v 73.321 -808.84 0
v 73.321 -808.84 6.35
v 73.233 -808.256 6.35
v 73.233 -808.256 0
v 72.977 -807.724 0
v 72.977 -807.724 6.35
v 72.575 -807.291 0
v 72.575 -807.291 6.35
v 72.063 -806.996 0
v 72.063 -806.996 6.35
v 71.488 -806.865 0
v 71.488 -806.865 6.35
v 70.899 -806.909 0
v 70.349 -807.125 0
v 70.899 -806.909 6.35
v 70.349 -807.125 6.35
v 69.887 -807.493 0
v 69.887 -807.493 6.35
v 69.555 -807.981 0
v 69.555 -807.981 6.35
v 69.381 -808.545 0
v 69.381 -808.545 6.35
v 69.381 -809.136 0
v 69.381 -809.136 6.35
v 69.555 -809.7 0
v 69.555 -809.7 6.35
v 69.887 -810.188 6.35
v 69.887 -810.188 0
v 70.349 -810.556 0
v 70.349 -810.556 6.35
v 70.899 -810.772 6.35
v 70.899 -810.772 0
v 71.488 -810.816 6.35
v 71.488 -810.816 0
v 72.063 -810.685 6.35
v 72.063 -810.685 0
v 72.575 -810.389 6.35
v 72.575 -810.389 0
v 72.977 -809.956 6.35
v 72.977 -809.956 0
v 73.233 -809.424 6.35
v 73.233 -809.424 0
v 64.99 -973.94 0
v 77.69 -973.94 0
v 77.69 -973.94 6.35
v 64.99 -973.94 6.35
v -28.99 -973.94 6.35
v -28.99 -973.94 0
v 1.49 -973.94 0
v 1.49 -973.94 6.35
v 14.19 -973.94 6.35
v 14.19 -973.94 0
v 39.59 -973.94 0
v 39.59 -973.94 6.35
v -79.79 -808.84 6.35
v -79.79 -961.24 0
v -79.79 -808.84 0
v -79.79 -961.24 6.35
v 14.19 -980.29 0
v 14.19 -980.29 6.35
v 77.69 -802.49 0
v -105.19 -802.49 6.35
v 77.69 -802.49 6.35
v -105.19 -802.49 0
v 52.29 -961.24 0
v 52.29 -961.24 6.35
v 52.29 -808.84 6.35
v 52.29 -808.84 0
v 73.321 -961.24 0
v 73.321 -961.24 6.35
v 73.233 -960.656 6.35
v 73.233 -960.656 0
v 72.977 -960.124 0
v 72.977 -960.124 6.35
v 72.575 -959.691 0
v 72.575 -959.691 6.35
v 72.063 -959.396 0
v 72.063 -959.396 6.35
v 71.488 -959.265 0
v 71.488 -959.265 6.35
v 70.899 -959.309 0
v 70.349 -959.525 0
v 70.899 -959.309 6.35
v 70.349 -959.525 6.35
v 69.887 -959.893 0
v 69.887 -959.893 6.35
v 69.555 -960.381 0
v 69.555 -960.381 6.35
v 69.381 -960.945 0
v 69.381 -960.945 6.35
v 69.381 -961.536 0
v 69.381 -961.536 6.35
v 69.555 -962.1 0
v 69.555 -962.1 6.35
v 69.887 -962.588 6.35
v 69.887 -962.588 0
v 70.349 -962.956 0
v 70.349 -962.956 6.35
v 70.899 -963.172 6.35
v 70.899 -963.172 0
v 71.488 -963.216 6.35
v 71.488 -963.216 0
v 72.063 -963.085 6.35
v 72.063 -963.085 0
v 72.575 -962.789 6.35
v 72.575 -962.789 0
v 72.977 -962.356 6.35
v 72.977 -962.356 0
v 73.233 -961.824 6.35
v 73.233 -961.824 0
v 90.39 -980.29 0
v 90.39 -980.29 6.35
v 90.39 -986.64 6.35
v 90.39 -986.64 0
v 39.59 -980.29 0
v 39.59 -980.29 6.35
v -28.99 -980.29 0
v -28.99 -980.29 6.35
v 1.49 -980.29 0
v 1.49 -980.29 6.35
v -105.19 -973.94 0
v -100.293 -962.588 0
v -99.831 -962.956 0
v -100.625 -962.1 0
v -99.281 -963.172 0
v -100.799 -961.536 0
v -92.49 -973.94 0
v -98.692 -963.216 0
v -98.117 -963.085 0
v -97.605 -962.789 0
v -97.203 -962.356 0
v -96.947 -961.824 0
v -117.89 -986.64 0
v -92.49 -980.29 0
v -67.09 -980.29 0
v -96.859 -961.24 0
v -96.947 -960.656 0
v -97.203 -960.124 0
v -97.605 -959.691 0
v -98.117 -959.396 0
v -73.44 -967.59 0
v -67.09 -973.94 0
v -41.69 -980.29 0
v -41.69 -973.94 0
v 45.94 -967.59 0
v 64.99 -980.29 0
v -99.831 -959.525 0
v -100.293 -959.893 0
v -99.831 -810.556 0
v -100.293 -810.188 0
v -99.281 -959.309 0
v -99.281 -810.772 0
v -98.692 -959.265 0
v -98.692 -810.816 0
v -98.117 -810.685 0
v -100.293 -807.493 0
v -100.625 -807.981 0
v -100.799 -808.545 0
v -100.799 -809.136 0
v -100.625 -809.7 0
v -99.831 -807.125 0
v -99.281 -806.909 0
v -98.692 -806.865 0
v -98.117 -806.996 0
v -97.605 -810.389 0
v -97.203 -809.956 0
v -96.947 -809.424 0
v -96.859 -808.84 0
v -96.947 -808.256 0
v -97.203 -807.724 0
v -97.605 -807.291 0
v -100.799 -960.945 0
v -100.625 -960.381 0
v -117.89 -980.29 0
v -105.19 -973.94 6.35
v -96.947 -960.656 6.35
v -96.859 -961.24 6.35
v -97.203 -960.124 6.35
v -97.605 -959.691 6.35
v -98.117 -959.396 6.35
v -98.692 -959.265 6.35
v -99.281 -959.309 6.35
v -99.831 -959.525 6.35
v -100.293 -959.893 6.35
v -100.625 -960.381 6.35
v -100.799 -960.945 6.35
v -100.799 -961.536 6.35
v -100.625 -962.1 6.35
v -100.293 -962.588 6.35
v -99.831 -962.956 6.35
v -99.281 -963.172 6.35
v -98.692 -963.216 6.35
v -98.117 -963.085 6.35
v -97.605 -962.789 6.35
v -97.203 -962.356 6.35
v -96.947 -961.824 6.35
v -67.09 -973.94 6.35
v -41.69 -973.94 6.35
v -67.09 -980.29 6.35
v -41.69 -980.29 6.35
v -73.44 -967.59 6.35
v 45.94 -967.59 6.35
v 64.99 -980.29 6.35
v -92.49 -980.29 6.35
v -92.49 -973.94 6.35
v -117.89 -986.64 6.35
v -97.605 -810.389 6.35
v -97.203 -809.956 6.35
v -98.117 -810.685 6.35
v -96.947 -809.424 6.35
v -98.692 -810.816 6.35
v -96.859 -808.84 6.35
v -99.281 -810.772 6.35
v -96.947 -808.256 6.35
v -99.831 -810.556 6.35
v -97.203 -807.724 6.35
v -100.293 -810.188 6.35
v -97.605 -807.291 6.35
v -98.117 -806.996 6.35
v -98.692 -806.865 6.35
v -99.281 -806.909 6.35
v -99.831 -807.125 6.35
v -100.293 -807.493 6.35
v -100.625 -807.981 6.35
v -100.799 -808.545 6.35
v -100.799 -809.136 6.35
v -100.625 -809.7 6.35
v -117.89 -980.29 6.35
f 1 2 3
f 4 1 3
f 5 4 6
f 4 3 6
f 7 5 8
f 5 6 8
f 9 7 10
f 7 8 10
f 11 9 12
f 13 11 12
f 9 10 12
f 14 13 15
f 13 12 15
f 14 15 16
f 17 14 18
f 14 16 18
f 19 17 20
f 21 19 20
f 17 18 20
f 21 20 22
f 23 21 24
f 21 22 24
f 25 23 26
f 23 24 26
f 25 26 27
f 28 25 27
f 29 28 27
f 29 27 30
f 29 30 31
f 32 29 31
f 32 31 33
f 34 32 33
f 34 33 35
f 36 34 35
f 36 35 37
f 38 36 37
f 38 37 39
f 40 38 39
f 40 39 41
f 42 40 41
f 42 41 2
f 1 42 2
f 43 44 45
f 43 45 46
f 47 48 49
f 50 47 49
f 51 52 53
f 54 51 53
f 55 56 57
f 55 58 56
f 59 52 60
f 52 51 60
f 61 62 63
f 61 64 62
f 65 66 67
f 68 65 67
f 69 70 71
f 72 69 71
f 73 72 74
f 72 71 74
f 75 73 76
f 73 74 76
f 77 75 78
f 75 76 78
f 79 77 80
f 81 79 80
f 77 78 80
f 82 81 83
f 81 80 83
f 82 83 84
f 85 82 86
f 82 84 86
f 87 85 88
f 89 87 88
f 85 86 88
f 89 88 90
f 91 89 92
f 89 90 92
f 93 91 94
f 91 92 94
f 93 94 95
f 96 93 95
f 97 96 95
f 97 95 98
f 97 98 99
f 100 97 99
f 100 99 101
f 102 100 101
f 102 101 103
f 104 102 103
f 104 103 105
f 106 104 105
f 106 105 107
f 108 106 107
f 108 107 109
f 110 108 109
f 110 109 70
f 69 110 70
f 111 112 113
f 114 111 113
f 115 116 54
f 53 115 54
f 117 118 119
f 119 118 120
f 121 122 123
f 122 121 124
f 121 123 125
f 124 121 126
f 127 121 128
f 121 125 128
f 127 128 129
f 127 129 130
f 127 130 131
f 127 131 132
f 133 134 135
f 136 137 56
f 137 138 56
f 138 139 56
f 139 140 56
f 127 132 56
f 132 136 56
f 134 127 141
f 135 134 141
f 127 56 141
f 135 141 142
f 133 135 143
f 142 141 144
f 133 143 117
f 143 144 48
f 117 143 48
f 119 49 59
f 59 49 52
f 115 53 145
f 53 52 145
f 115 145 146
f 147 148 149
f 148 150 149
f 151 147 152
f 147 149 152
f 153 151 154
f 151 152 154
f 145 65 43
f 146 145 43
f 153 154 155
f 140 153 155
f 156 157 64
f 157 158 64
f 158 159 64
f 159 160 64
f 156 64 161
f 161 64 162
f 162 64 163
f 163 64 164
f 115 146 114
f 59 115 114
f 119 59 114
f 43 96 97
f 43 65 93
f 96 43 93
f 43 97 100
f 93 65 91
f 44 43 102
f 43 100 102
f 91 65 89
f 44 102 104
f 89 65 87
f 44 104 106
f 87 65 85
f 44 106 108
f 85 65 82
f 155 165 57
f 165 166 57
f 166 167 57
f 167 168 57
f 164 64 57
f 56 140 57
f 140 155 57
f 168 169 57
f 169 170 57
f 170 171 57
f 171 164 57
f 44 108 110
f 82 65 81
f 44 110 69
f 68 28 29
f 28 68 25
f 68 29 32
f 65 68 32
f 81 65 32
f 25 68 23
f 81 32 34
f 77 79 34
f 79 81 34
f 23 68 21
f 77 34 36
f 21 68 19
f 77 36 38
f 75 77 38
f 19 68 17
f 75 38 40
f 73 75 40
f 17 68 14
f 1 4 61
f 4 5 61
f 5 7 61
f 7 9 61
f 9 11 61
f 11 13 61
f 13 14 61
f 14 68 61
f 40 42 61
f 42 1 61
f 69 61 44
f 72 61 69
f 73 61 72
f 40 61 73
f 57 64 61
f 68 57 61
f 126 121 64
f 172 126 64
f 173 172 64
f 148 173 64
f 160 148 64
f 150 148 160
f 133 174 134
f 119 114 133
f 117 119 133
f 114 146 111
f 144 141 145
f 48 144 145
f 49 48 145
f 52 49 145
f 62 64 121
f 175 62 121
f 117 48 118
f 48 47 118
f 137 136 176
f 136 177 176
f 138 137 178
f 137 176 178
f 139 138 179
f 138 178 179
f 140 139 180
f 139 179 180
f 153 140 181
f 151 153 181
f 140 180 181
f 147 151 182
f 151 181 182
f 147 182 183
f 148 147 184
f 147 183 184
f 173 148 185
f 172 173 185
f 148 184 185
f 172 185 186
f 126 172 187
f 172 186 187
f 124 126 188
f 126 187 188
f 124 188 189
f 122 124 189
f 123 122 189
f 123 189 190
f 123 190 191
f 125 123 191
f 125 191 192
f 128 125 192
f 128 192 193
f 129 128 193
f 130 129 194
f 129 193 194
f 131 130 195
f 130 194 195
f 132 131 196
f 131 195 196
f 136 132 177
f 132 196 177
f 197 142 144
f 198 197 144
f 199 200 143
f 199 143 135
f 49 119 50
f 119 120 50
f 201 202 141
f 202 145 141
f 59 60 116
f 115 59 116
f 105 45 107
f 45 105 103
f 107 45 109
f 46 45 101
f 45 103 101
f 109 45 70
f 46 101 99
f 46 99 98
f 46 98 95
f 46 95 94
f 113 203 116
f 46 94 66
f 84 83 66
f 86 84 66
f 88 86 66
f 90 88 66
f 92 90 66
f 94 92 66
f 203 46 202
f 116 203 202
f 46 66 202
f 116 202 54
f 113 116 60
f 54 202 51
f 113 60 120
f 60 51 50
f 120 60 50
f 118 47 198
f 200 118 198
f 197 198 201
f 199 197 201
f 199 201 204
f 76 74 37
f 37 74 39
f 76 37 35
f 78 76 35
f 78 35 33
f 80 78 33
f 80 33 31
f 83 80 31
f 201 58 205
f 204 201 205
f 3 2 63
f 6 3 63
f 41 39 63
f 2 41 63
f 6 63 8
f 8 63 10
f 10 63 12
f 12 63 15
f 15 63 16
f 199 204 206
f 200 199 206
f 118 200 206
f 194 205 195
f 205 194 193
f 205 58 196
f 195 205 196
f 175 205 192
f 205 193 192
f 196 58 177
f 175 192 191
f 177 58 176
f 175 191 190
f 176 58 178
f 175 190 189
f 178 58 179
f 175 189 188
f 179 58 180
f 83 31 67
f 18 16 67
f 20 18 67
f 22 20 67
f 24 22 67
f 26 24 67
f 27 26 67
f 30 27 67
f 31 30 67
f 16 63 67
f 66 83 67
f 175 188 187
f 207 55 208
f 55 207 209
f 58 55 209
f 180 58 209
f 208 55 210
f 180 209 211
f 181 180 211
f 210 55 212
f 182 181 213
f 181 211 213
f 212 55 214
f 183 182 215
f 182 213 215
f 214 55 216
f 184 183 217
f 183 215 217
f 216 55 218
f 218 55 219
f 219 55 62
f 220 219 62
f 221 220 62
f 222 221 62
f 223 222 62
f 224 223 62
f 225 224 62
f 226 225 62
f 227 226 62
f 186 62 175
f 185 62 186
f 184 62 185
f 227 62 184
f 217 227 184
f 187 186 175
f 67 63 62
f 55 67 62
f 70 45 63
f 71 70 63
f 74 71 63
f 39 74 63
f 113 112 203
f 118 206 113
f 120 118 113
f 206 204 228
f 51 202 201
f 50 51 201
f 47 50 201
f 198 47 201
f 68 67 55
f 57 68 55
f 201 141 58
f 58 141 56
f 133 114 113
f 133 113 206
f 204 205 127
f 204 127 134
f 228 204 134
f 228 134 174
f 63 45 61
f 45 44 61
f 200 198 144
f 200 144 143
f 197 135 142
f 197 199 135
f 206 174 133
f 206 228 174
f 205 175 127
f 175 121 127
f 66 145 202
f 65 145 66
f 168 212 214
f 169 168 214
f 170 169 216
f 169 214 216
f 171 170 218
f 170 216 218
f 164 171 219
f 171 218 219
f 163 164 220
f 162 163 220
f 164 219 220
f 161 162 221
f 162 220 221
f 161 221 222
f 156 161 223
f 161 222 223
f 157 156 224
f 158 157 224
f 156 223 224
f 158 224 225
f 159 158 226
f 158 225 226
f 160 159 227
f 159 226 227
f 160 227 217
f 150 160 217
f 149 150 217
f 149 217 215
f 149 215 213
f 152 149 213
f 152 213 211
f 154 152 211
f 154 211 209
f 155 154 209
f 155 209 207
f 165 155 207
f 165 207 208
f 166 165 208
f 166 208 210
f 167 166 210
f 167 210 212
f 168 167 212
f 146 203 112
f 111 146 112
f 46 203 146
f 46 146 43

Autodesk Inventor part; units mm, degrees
ref_plane "YZ Plane" through (0, 0, 0) normal (1, 0, 0) x (0, 1, 0)
ref_plane "XZ Plane" through (0, 0, 0) normal (0, 1, 0) x (-1, 0, 0)
ref_plane "XY Plane" through (0, 0, 0) normal (0, 0, 1) x (1, 0, 0)
sketch "Sketch1" plane through (0, 0, 0) normal (0, 0, 1) x (1, 0, 0)
  line L0 (-267.7504, 67.4597) -> (240.2496, 67.4597)
  line L1 (240.2496, 67.4597) -> (240.2496, -986.6403)
  line L2 (240.2496, -986.6403) -> (-267.7504, -986.6403)
  line L3 (-267.7504, -986.6403) -> (-267.7504, 67.4597)
  point P0 (0, 0)
  dimension "d0" = 508
  dimension "d1" = 1054.1
extrude "Extrusion1" add sketch "Sketch1" along normal blind 6.35
sketch "Sketch2" plane through (0, 0, 6.35) normal (0, 0, 1) x (1, 0, 0)
  line L0 (240.2496, -986.6403) -> (-267.7504, -986.6403) projected
  line L1 (-267.7504, -986.6403) -> (-13.7504, -986.6403)
  line L2 (-13.7504, -986.6403) -> (-13.7504, -980.2903)
  line L3 (-13.7504, -980.2903) -> (1.4896, -980.2903)
  line L4 (1.4896, -980.2903) -> (-28.9904, -980.2903)
  line L5 (-28.9904, -980.2903) -> (1.4896, -980.2903)
  line L6 (1.4896, -980.2903) -> (1.4896, -973.9403)
  line L7 (1.4896, -973.9403) -> (-28.9904, -973.9403)
  line L8 (-28.9904, -973.9403) -> (-28.9904, -980.2903)
  point P0 (0, 0)
  dimension "d4" = 254
  dimension "d5" = 6.35
  dimension "d6" = 15.24
  dimension "d7" = 30.48
  dimension "d8" = 6.35
extrude "Extrusion2" cut sketch "Sketch2" against normal blind 104.14
sketch "Sketch3" plane through (0, 0, 6.35) normal (0, 0, 1) x (1, 0, 0)
  line L0 (240.2496, -986.6403) -> (-267.7504, -986.6403) projected
  line L1 (1.4896, -980.2903) -> (14.1896, -980.2903)
  line L2 (-28.9904, -980.2903) -> (-41.6904, -980.2903)
  line L3 (-41.6904, -980.2903) -> (-67.0904, -980.2903)
  line L4 (-67.0904, -980.2903) -> (-67.0904, -973.9403)
  line L5 (-67.0904, -973.9403) -> (-41.6904, -973.9403)
  line L6 (-41.6904, -973.9403) -> (-41.6904, -980.2903)
  line L7 (14.1896, -980.2903) -> (39.5896, -980.2903)
  line L8 (39.5896, -980.2903) -> (39.5896, -973.9403)
  line L9 (39.5896, -973.9403) -> (14.1896, -973.9403)
  line L10 (14.1896, -973.9403) -> (14.1896, -980.2903)
  point P0 (0, 0)
  dimension "d11" = 12.7
  dimension "d12" = 12.7
  dimension "d13" = 25.4
  dimension "d14" = 25.4
extrude "Extrusion3" cut sketch "Sketch3" against normal blind 104.14
sketch "Sketch4" plane through (0, 0, 6.35) normal (0, 0, 1) x (1, 0, 0)
  line L0 (-67.0904, -973.9403) -> (-41.6904, -973.9403) projected
  line L1 (14.1896, -973.9403) -> (39.5896, -973.9403) projected
  line L2 (-28.9904, -973.9403) -> (1.4896, -973.9403) projected
  line L3 (240.2496, 67.4597) -> (240.2496, -986.6403) projected
  line L4 (-267.7504, -986.6403) -> (-267.7504, 67.4597) projected
  line L5 (240.2496, -986.6403) -> (-267.7504, -986.6403) projected
  line L6 (-67.0904, -980.2903) -> (-92.4904, -980.2903)
  line L7 (-92.4904, -980.2903) -> (-117.8904, -980.2903)
  line L8 (-117.8904, -980.2903) -> (-117.8904, -986.6403)
  line L9 (39.5896, -980.2903) -> (64.9896, -980.2903)
  line L10 (64.9896, -980.2903) -> (90.3896, -980.2903)
  line L11 (90.3896, -980.2903) -> (90.3896, -986.6403)
  line L12 (-41.6904, -973.9403) -> (-28.9904, -973.9403)
  line L13 (1.4896, -973.9403) -> (14.1896, -973.9403)
  line L14 (-67.0904, -973.9403) -> (-79.7904, -973.9403)
  line L15 (39.5896, -973.9403) -> (52.2896, -973.9403)
  line L16 (-79.7904, -973.9403) -> (-79.7904, -802.4903)
  line L17 (52.2896, -973.9403) -> (52.2896, -802.4903)
  line L18 (52.2896, -802.4903) -> (-79.7904, -802.4903)
  line L19 (-79.7904, -802.4903) -> (-105.1904, -802.4903)
  line L20 (-105.1904, -802.4903) -> (-105.1904, -815.1903)
  line L21 (-105.1904, -815.1903) -> (-92.4904, -815.1903)
  line L22 (-92.4904, -815.1903) -> (-92.4904, -980.2903)
  line L23 (64.9896, -980.2903) -> (64.9896, -815.1903)
  line L24 (64.9896, -815.1903) -> (77.6896, -815.1903)
  line L25 (77.6896, -815.1903) -> (77.6896, -802.4903)
  line L26 (77.6896, -802.4903) -> (52.2896, -802.4903)
  line L27 (-105.1904, -802.4903) -> (-267.7504, -802.4903)
  line L28 (77.6896, -802.4903) -> (240.2496, -802.4903)
  point P0 (0, 0)
  dimension "d17" = 25.4
  dimension "d18" = 25.4
  dimension "d19" = 25.4
  dimension "d20" = 25.4
  dimension "d21" = 171.45
  dimension "d22" = 25.4
  dimension "d23" = 12.7
extrude "Extrusion4" cut sketch "Sketch4" against normal blind 104.14 contours L14 L16 L18 L17 L15 L1 L13 L2 L12 L0 | L20 L21 L22 L7 L8 L5 L4 L27 | L28 L3 L5 L11 L10 L23 L24 L25
sketch "Sketch5" plane through (0, 0, 6.35) normal (0, 0, 1) x (1, 0, 0)
  line L0 (-92.4904, -815.1903) -> (-92.4904, -980.2903) projected
  line L1 (64.9896, -980.2903) -> (64.9896, -815.1903) projected
  line L2 (-92.4904, -973.9403) -> (-92.4904, -967.5903)
  line L3 (-92.4904, -967.5903) -> (-105.1904, -967.5903)
  line L4 (-105.1904, -967.5903) -> (-105.1904, -954.8903)
  line L5 (-105.1904, -954.8903) -> (-92.4904, -954.8903)
  line L6 (64.9896, -954.8903) -> (77.6896, -954.8903)
  line L7 (77.6896, -954.8903) -> (77.6896, -967.5903)
  line L8 (77.6896, -967.5903) -> (64.9896, -967.5903)
  point P0 (0, 0)
  dimension "d26" = 6.35
  dimension "d27" = 12.7
extrude "Extrusion5" add sketch "Sketch5" against normal blind 6.35
sketch "Sketch6" plane through (0, 0, 6.35) normal (0, 0, 1) x (1, 0, 0)
  line L0 (-79.7904, -802.4903) -> (52.2896, -802.4903) projected
  line L1 (-267.7504, -802.4903) -> (-105.1904, -802.4903) projected
  line L2 (77.6896, -802.4903) -> (240.2496, -802.4903) projected
  line L3 (-267.7504, -802.4903) -> (-242.3504, -802.4903)
  line L4 (-242.3504, -802.4903) -> (-216.9504, -802.4903)
  line L5 (-216.9504, -802.4903) -> (-140.7504, -802.4903)
  line L6 (-140.7504, -802.4903) -> (-115.3504, -802.4903)
  line L7 (-115.3504, -802.4903) -> (-39.1504, -802.4903)
  line L8 (-39.1504, -802.4903) -> (-13.7504, -802.4903)
  line L9 (-13.7504, -802.4903) -> (62.4496, -802.4903)
  line L10 (62.4496, -802.4903) -> (87.8496, -802.4903)
  line L11 (87.8496, -802.4903) -> (164.0496, -802.4903)
  line L12 (164.0496, -802.4903) -> (189.4496, -802.4903)
  line L13 (189.4496, -802.4903) -> (265.6496, -802.4903)
  line L14 (265.6496, -802.4903) -> (240.2496, -802.4903)
  line L15 (-242.3504, -802.4903) -> (-216.9504, -802.4903)
  line L16 (-216.9504, -802.4903) -> (-216.9504, -796.1403)
  line L17 (-216.9504, -796.1403) -> (-242.3504, -796.1403)
  line L18 (-242.3504, -796.1403) -> (-242.3504, -802.4903)
  line L19 (-140.7504, -802.4903) -> (-115.3504, -802.4903)
  line L20 (-115.3504, -802.4903) -> (-115.3504, -796.1403)
  line L21 (-115.3504, -796.1403) -> (-140.7504, -796.1403)
  line L22 (-140.7504, -796.1403) -> (-140.7504, -802.4903)
  line L23 (-39.1504, -802.4903) -> (-13.7504, -802.4903)
  line L24 (-13.7504, -802.4903) -> (-13.7504, -796.1403)
  line L25 (-13.7504, -796.1403) -> (-39.1504, -796.1403)
  line L26 (-39.1504, -796.1403) -> (-39.1504, -802.4903)
  line L27 (62.4496, -802.4903) -> (87.8496, -802.4903)
  line L28 (87.8496, -802.4903) -> (87.8496, -796.1403)
  line L29 (87.8496, -796.1403) -> (62.4496, -796.1403)
  line L30 (62.4496, -796.1403) -> (62.4496, -802.4903)
  line L31 (164.0496, -802.4903) -> (189.4496, -802.4903)
  line L32 (189.4496, -802.4903) -> (189.4496, -796.1403)
  line L33 (189.4496, -796.1403) -> (164.0496, -796.1403)
  line L34 (164.0496, -796.1403) -> (164.0496, -802.4903)
  point P0 (0, 0)
  dimension "d30" = 25.4
  dimension "d31" = 25.4
  dimension "d32" = 76.2
  dimension "d33" = 25.4
  dimension "d34" = 76.2
  dimension "d35" = 25.4
  dimension "d36" = 76.2
  dimension "d37" = 25.4
  dimension "d38" = 76.2
  dimension "d39" = 25.4
  dimension "d40" = 76.2
  dimension "d41" = 25.4
  dimension "d42" = 6.35
extrude "Extrusion6" cut sketch "Sketch6" against normal blind 25.4
sketch "Sketch7" plane through (0, 0, 6.35) normal (0, 0, 1) x (1, 0, 0)
  line L0 (-267.7504, -802.4903) -> (240.2496, -802.4903)
  line L1 (240.2496, -802.4903) -> (240.2496, -808.8403)
  line L2 (240.2496, -808.8403) -> (-267.7504, -808.8403)
  line L3 (-267.7504, -808.8403) -> (-267.7504, -802.4903)
  point P0 (0, 0)
extrude "Extrusion7" add sketch "Sketch7" against normal blind 6.35
sketch "Sketch8" plane through (0, 0, 6.35) normal (0, 0, 1) x (1, 0, 0)
  line L0 (-216.9504, -796.1403) -> (-191.5504, -796.1403)
  line L1 (-191.5504, -796.1403) -> (-191.5504, -789.7903)
  line L2 (-191.5504, -789.7903) -> (-216.9504, -789.7903)
  line L3 (-216.9504, -789.7903) -> (-216.9504, -796.1403)
  line L4 (-115.3504, -796.1403) -> (-89.9504, -796.1403)
  line L5 (-89.9504, -796.1403) -> (-89.9504, -789.7903)
  line L6 (-89.9504, -789.7903) -> (-115.3504, -789.7903)
  line L7 (-115.3504, -789.7903) -> (-115.3504, -796.1403)
  line L8 (-13.7504, -796.1403) -> (11.6496, -796.1403)
  line L9 (11.6496, -796.1403) -> (11.6496, -789.7903)
  line L10 (11.6496, -789.7903) -> (-13.7504, -789.7903)
  line L11 (-13.7504, -789.7903) -> (-13.7504, -796.1403)
  line L12 (87.8496, -796.1403) -> (113.2496, -796.1403)
  line L13 (113.2496, -796.1403) -> (113.2496, -789.7903)
  line L14 (113.2496, -789.7903) -> (87.8496, -789.7903)
  line L15 (87.8496, -789.7903) -> (87.8496, -796.1403)
  line L16 (189.4496, -796.1403) -> (214.8496, -796.1403)
  line L17 (214.8496, -796.1403) -> (214.8496, -789.7903)
  line L18 (214.8496, -789.7903) -> (189.4496, -789.7903)
  line L19 (189.4496, -789.7903) -> (189.4496, -796.1403)
  point P0 (0, 0)
  dimension "d47" = 25.4
  dimension "d48" = 6.35
  dimension "d49" = 25.4
  dimension "d50" = 25.4
  dimension "d51" = 25.4
  dimension "d52" = 25.4
extrude "Extrusion8" cut sketch "Sketch8" against normal blind 6.35
sketch "Sketch9" plane through (0, 0, 6.35) normal (0, 0, 1) x (1, 0, 0)
  circle A0 centre (-98.8404, -808.8403) radius 1.9812
  circle A1 centre (-98.8404, -961.2403) radius 1.9812
  circle A2 centre (71.3396, -961.2403) radius 1.9812
  circle A3 centre (71.3396, -808.8403) radius 1.9812
  point P0 (0, 0)
  dimension "d55" = 3.9624
  dimension "d56" = 3.9624
  dimension "d57" = 3.9624
  dimension "d58" = 3.9624
extrude "Extrusion9" cut sketch "Sketch9" against normal blind 6.35
sketch "Sketch10" plane through (0, 0, 0) normal (0, 0, -1) x (-1, 0, 0)
  line L0 (-77.6896, -815.1903) -> (-64.9896, -815.1903) projected
  line L1 (-64.9896, -815.1903) -> (-64.9896, -954.8903) projected
  line L2 (-77.6896, -954.8903) -> (-64.9896, -954.8903) projected
  line L3 (-64.9896, -967.5903) -> (-77.6896, -967.5903) projected
  line L4 (-64.9896, -967.5903) -> (-64.9896, -980.2903) projected
  line L5 (92.4904, -980.2903) -> (92.4904, -967.5903) projected
  line L6 (105.1904, -967.5903) -> (92.4904, -967.5903) projected
  line L7 (92.4904, -954.8903) -> (105.1904, -954.8903) projected
  line L8 (92.4904, -954.8903) -> (92.4904, -815.1903) projected
  line L9 (92.4904, -815.1903) -> (105.1904, -815.1903) projected
  line L10 (-77.6896, -808.8403) -> (-240.2496, -808.8403) projected
  line L11 (-77.6896, -815.1903) -> (-77.6896, -954.8903)
  line L12 (105.1904, -954.8903) -> (105.1904, -815.1903)
  line L13 (105.1904, -967.5903) -> (105.1904, -973.9403)
  line L14 (105.1904, -973.9403) -> (92.4904, -973.9403)
  line L15 (-77.6896, -967.5903) -> (-77.6896, -973.9403)
  line L16 (-77.6896, -973.9403) -> (-64.9896, -973.9403)
  point P0 (0, 0)
extrude "Extrusion10" add sketch "Sketch10" against normal blind 6.35
sketch "Sketch11" plane through (0, 0, 0) normal (0, 0, -1) x (-1, 0, 0)
  line L0 (79.7904, -808.8403) -> (79.7904, -973.9403) projected
  line L1 (79.7904, -973.9403) -> (67.0904, -973.9403) projected
  line L2 (-39.5896, -973.9403) -> (-52.2896, -973.9403) projected
  line L3 (-52.2896, -973.9403) -> (-52.2896, -808.8403) projected
  line L4 (-39.5896, -973.9403) -> (-52.2896, -961.2403)
  line L5 (67.0904, -973.9403) -> (79.7904, -961.2403)
  line L6 (-45.9396, -967.5903) -> (73.4404, -967.5903)
  line L7 (-39.5896, -973.9403) -> (67.0904, -973.9403)
  point P0 (0, 0)
extrude "Extrusion11" add sketch "Sketch11" against normal blind 6.35
sketch "Sketch12" plane through (0, 0, 0) normal (0, 0, -1) x (-1, 0, 0)
  line L0 (267.7504, -808.8403) -> (267.7504, 67.4597) projected
  line L1 (-240.2496, 67.4597) -> (-240.2496, -808.8403) projected
  line L2 (-240.2496, 67.4597) -> (-214.8496, 67.4597)
  line L3 (-214.8496, 67.4597) -> (-214.8496, 42.0597)
  line L4 (-214.8496, 42.0597) -> (-240.2496, 42.0597)
  line L5 (-240.2496, 42.0597) -> (-240.2496, 67.4597)
  line L6 (267.7504, 67.4597) -> (242.3504, 67.4597)
  line L7 (242.3504, 67.4597) -> (242.3504, 42.0597)
  line L8 (242.3504, 42.0597) -> (267.7504, 42.0597)
  line L9 (267.7504, 42.0597) -> (267.7504, 67.4597)
  line L10 (-240.2496, -789.7903) -> (-214.8496, -789.7903)
  line L11 (-214.8496, -789.7903) -> (-214.8496, -764.3903)
  line L12 (-214.8496, -764.3903) -> (-240.2496, -764.3903)
  line L13 (-240.2496, -764.3903) -> (-240.2496, -789.7903)
  line L14 (267.7504, -789.7903) -> (242.3504, -789.7903)
  line L15 (242.3504, -789.7903) -> (242.3504, -764.3903)
  line L16 (242.3504, -764.3903) -> (267.7504, -764.3903)
  line L17 (267.7504, -764.3903) -> (267.7504, -789.7903)
  line L18 (-214.8496, -764.3903) -> (242.3504, -764.3903)
  line L19 (242.3504, -764.3903) -> (242.3504, 42.0597)
  line L20 (242.3504, 42.0597) -> (-214.8496, 42.0597)
  line L21 (-214.8496, 42.0597) -> (-214.8496, -764.3903)
  point P0 (0, 0)
  dimension "d65" = 25.4
  dimension "d66" = 25.4
  dimension "d67" = 25.4
  dimension "d68" = 25.4
  dimension "d69" = 25.4
  dimension "d70" = 25.4
  dimension "d71" = 25.4
  dimension "d72" = 25.4
extrude "Extrusion12" cut sketch "Sketch12" against normal blind 6.35 contours L18 L21 L20 L19
fillet "Fillet1" radius 12.7 1 edges at (-242.3504, 42.0597, 3.175)
fillet "Fillet2" radius 12.7 3 edges at (214.8496, 42.0597, 3.175) (214.8496, -764.3903, 3.175) (-242.3504, -764.3903, 3.175)
sketch "Sketch13" plane through (0, 0, 0) normal (0, 0, -1) x (-1, 0, 0)
  line L0 (-214.8496, -751.6903) -> (-214.8496, 29.3597) projected
  arc A0 (-202.1496, 42.0597) -> (-214.8496, 29.3597) centre (-202.1496, 29.3597) ccw projected
  line L1 (-202.1496, 42.0597) -> (229.6504, 42.0597) projected
  arc A1 (242.3504, 29.3597) -> (229.6504, 42.0597) centre (229.6504, 29.3597) ccw projected
  line L2 (242.3504, 29.3597) -> (242.3504, -751.6903) projected
  arc A2 (229.6504, -764.3903) -> (242.3504, -751.6903) centre (229.6504, -751.6903) ccw projected
  arc A3 (-214.8496, -751.6903) -> (-202.1496, -764.3903) centre (-202.1496, -751.6903) ccw projected
  line L3 (267.7504, -808.8403) -> (267.7504, 67.4597) projected
  line L4 (267.7504, 67.4597) -> (-240.2496, 67.4597) projected
  line L5 (-240.2496, 67.4597) -> (-240.2496, -808.8403) projected
  line L6 (-202.1496, -764.3903) -> (-240.2496, -764.3903)
  line L7 (229.6504, -764.3903) -> (267.7504, -764.3903)
  point P0 (0, 0)
extrude "Extrusion13" cut sketch "Sketch13" against normal blind 25.4
sketch "Sketch14" plane through (0, 0, 0) normal (0, 0, -1) x (-1, 0, 0)
  line L0 (-240.2496, -764.3903) -> (-202.1496, -764.3903)
  line L1 (-202.1496, -764.3903) -> (-202.1496, -688.1903)
  line L2 (-202.1496, -688.1903) -> (-240.2496, -688.1903)
  line L3 (-240.2496, -688.1903) -> (-240.2496, -764.3903)
  line L4 (267.7504, -764.3903) -> (229.6504, -764.3903)
  line L5 (229.6504, -764.3903) -> (229.6504, -688.1903)
  line L6 (229.6504, -688.1903) -> (267.7504, -688.1903)
  line L7 (267.7504, -688.1903) -> (267.7504, -764.3903)
  point P0 (0, 0)
  dimension "d79" = 76.2
  dimension "d80" = 76.2
extrude "Extrusion14" add sketch "Sketch14" against normal blind 6.35
sketch "Sketch15" plane through (0, 0, 0) normal (0, 0, -1) x (-1, 0, 0)
  line L0 (-240.2496, -688.1903) -> (-221.1996, -688.1903)
  line L1 (-221.1996, -688.1903) -> (-221.1996, -707.2403)
  line L2 (-221.1996, -707.2403) -> (-240.2496, -707.2403)
  line L3 (-240.2496, -707.2403) -> (-240.2496, -688.1903)
  line L4 (267.7504, -688.1903) -> (248.7004, -688.1903)
  line L5 (248.7004, -688.1903) -> (248.7004, -707.2403)
  line L6 (248.7004, -707.2403) -> (267.7504, -707.2403)
  line L7 (267.7504, -707.2403) -> (267.7504, -688.1903)
  circle A0 centre (248.7004, -707.2403) radius 1.9812
  circle A1 centre (-221.1996, -707.2403) radius 1.9812
  point P0 (0, 0)
  dimension "d83" = 19.05
  dimension "d84" = 19.05
  dimension "d85" = 19.05
  dimension "d86" = 19.05
  dimension "d87" = 3.9624
  dimension "d88" = 3.9624
extrude "Extrusion15" cut sketch "Sketch15" against normal blind 6.35 contours A1 L2 L1 | L1 L2 A1 | A0 L6 L5 | L5 L6 A0
sketch "Sketch16" plane through (0, 0, 0) normal (0, 0, -1) x (-1, 0, 0)
  line L0 (-240.2496, -688.1903) -> (-240.2496, -808.8403) projected
  line L1 (-240.2496, -688.1903) -> (-233.8996, -688.1903)
  line L2 (-233.8996, -688.1903) -> (-233.8996, -713.5903)
  line L3 (-233.8996, -713.5903) -> (-240.2496, -713.5903)
  line L4 (-240.2496, -713.5903) -> (-240.2496, -688.1903)
  line L5 (-233.8996, -713.5903) -> (-240.2496, -713.5903)
  line L6 (-240.2496, -713.5903) -> (-240.2496, -738.9903)
  line L7 (-240.2496, -738.9903) -> (-233.8996, -738.9903)
  line L8 (-233.8996, -738.9903) -> (-233.8996, -713.5903)
  line L9 (-233.8996, -738.9903) -> (-240.2496, -738.9903)
  line L10 (-240.2496, -738.9903) -> (-240.2496, -764.3903)
  line L11 (-240.2496, -764.3903) -> (-233.8996, -764.3903)
  line L12 (-233.8996, -764.3903) -> (-233.8996, -738.9903)
  line L13 (-233.8996, -764.3903) -> (-240.2496, -764.3903)
  line L14 (-240.2496, -764.3903) -> (-240.2496, -789.7903)
  line L15 (-240.2496, -789.7903) -> (-233.8996, -789.7903)
  line L16 (-233.8996, -789.7903) -> (-233.8996, -764.3903)
  point P0 (0, 0)
  dimension "d91" = 6.35
  dimension "d92" = 25.4
  dimension "d93" = 25.4
  dimension "d94" = 25.4
extrude "Extrusion16" cut sketch "Sketch16" against normal blind 6.35 contours L1 L2 L3 L0 | L7 L12 L11 L0
sketch "Sketch17" plane through (0, 0, 0) normal (0, 0, -1) x (-1, 0, 0)
  line L0 (267.7504, -808.8403) -> (267.7504, -688.1903) projected
  line L1 (267.7504, -688.1903) -> (261.4004, -688.1903)
  line L2 (261.4004, -688.1903) -> (261.4004, -713.5903)
  line L3 (261.4004, -713.5903) -> (267.7504, -713.5903)
  line L4 (267.7504, -713.5903) -> (267.7504, -688.1903)
  line L5 (261.4004, -713.5903) -> (267.7504, -713.5903)
  line L6 (267.7504, -713.5903) -> (267.7504, -738.9903)
  line L7 (267.7504, -738.9903) -> (261.4004, -738.9903)
  line L8 (261.4004, -738.9903) -> (261.4004, -713.5903)
  line L9 (261.4004, -738.9903) -> (267.7504, -738.9903)
  line L10 (267.7504, -738.9903) -> (267.7504, -764.3903)
  line L11 (267.7504, -764.3903) -> (261.4004, -764.3903)
  line L12 (261.4004, -764.3903) -> (261.4004, -738.9903)
  point P0 (0, 0)
  dimension "d97" = 6.35
  dimension "d98" = 25.4
  dimension "d99" = 25.4
  dimension "d100" = 25.4
extrude "Extrusion17" cut sketch "Sketch17" against normal blind 6.35 contours L11 L12 L7 L0 | L3 L2 L1 L0
sketch "Sketch18" plane through (0, 0, 0) normal (0, 0, -1) x (-1, 0, 0)
  circle A0 centre (-221.1996, -707.2403) radius 1.9812 projected
  circle A1 centre (248.7004, -707.2403) radius 1.9812 projected
  line L0 (-233.8996, -688.1903) -> (261.4004, -688.1903)
  line L1 (261.4004, -688.1903) -> (261.4004, -713.5903)
  line L2 (261.4004, -713.5903) -> (-233.8996, -713.5903)
  line L3 (-233.8996, -713.5903) -> (-233.8996, -688.1903)
  point P0 (0, 0)
extrude "Extrusion18" cut sketch "Sketch18" against normal blind 25.4
sketch "Sketch19" plane through (0, 0, 0) normal (0, 0, -1) x (-1, 0, 0)
  line L0 (-202.1496, -713.5903) -> (-221.1996, -713.5903)
  line L1 (-221.1996, -713.5903) -> (-221.1996, -726.2903)
  line L2 (-221.1996, -726.2903) -> (-202.1496, -726.2903)
  line L3 (-202.1496, -726.2903) -> (-202.1496, -713.5903)
  circle A0 centre (-221.1996, -726.2903) radius 1.9812
  circle A1 centre (248.7004, -728.2715) radius 1.9812
  point P0 (0, 0)
  dimension "d105" = 19.05
  dimension "d106" = 12.7
  dimension "d107" = 3.9624
  dimension "d108" = 3.9624
extrude "Extrusion19" cut sketch "Sketch19" against normal blind 25.4 contours A0 L2 L1 | L1 L2 A0 | A1
sketch "Sketch20" plane through (0, 0, 0) normal (0, 0, -1) x (-1, 0, 0)
  line L0 (-214.8496, -789.7903) -> (242.3504, -789.7903)
  line L1 (242.3504, -789.7903) -> (242.3504, -802.4903)
  line L2 (242.3504, -802.4903) -> (-214.8496, -802.4903)
  line L3 (-214.8496, -802.4903) -> (-214.8496, -789.7903)
  point P0 (0, 0)
extrude "Extrusion20" add sketch "Sketch20" against normal blind 6.35
sketch "Sketch21" plane through (0, 0, 0) normal (0, 0, -1) x (-1, 0, 0)
  line L0 (-240.2496, -808.8403) -> (-227.5496, -808.8403)
  line L1 (-227.5496, -808.8403) -> (-227.5496, -796.1403)
  line L2 (-227.5496, -796.1403) -> (-240.2496, -796.1403)
  line L3 (-240.2496, -796.1403) -> (-240.2496, -808.8403)
  line L4 (-227.5496, -796.1403) -> (-202.1496, -796.1403)
  line L5 (-202.1496, -796.1403) -> (-202.1496, -789.7903)
  line L6 (-202.1496, -789.7903) -> (-227.5496, -789.7903)
  line L7 (-227.5496, -789.7903) -> (-227.5496, -796.1403)
  line L8 (-202.1496, -796.1403) -> (-176.7496, -796.1403)
  line L9 (-176.7496, -796.1403) -> (-176.7496, -802.4903)
  line L10 (-176.7496, -802.4903) -> (-202.1496, -802.4903)
  line L11 (-202.1496, -802.4903) -> (-202.1496, -796.1403)
  line L12 (-176.7496, -796.1403) -> (-151.3496, -796.1403)
  line L13 (-151.3496, -796.1403) -> (-151.3496, -802.4903)
  line L14 (-151.3496, -802.4903) -> (-176.7496, -802.4903)
  line L15 (-176.7496, -802.4903) -> (-176.7496, -796.1403)
  line L16 (-151.3496, -796.1403) -> (-125.9496, -796.1403)
  line L17 (-125.9496, -796.1403) -> (-125.9496, -802.4903)
  line L18 (-125.9496, -802.4903) -> (-151.3496, -802.4903)
  line L19 (-151.3496, -802.4903) -> (-151.3496, -796.1403)
  line L20 (-125.9496, -796.1403) -> (-100.5496, -796.1403)
  line L21 (-100.5496, -796.1403) -> (-100.5496, -789.7903)
  line L22 (-100.5496, -789.7903) -> (-125.9496, -789.7903)
  line L23 (-125.9496, -789.7903) -> (-125.9496, -796.1403)
  line L24 (-100.5496, -796.1403) -> (-75.1496, -796.1403)
  line L25 (-75.1496, -796.1403) -> (-75.1496, -802.4903)
  line L26 (-75.1496, -802.4903) -> (-100.5496, -802.4903)
  line L27 (-100.5496, -802.4903) -> (-100.5496, -796.1403)
  line L28 (-75.1496, -802.4903) -> (-49.7496, -802.4903)
  line L29 (-49.7496, -802.4903) -> (-49.7496, -796.1403)
  line L30 (-49.7496, -796.1403) -> (-75.1496, -796.1403)
  line L31 (-75.1496, -796.1403) -> (-75.1496, -802.4903)
  line L32 (-49.7496, -796.1403) -> (-24.3496, -796.1403)
  line L33 (-24.3496, -796.1403) -> (-24.3496, -802.4903)
  line L34 (-24.3496, -802.4903) -> (-49.7496, -802.4903)
  line L35 (-49.7496, -802.4903) -> (-49.7496, -796.1403)
  line L36 (-24.3496, -796.1403) -> (1.0504, -796.1403)
  line L37 (1.0504, -796.1403) -> (1.0504, -789.7903)
  line L38 (1.0504, -789.7903) -> (-24.3496, -789.7903)
  line L39 (-24.3496, -789.7903) -> (-24.3496, -796.1403)
  line L40 (1.0504, -796.1403) -> (26.4504, -796.1403)
  line L41 (26.4504, -796.1403) -> (26.4504, -802.4903)
  line L42 (26.4504, -802.4903) -> (1.0504, -802.4903)
  line L43 (1.0504, -802.4903) -> (1.0504, -796.1403)
  line L44 (26.4504, -796.1403) -> (51.8504, -796.1403)
  line L45 (51.8504, -796.1403) -> (51.8504, -802.4903)
  line L46 (51.8504, -802.4903) -> (26.4504, -802.4903)
  line L47 (26.4504, -802.4903) -> (26.4504, -796.1403)
  line L48 (51.8504, -796.1403) -> (77.2504, -796.1403)
  line L49 (77.2504, -796.1403) -> (77.2504, -802.4903)
  line L50 (77.2504, -802.4903) -> (51.8504, -802.4903)
  line L51 (51.8504, -802.4903) -> (51.8504, -796.1403)
  line L52 (77.2504, -796.1403) -> (102.6504, -796.1403)
  line L53 (102.6504, -796.1403) -> (102.6504, -789.7903)
  line L54 (102.6504, -789.7903) -> (77.2504, -789.7903)
  line L55 (77.2504, -789.7903) -> (77.2504, -796.1403)
  line L56 (102.6504, -796.1403) -> (128.0504, -796.1403)
  line L57 (128.0504, -796.1403) -> (128.0504, -802.4903)
  line L58 (128.0504, -802.4903) -> (102.6504, -802.4903)
  line L59 (102.6504, -802.4903) -> (102.6504, -796.1403)
  line L60 (128.0504, -796.1403) -> (153.4504, -796.1403)
  line L61 (153.4504, -796.1403) -> (153.4504, -802.4903)
  line L62 (153.4504, -802.4903) -> (128.0504, -802.4903)
  line L63 (128.0504, -802.4903) -> (128.0504, -796.1403)
  line L64 (153.4504, -796.1403) -> (178.8504, -796.1403)
  line L65 (178.8504, -796.1403) -> (178.8504, -802.4903)
  line L66 (178.8504, -802.4903) -> (153.4504, -802.4903)
  line L67 (153.4504, -802.4903) -> (153.4504, -796.1403)
  line L68 (178.8504, -796.1403) -> (204.2504, -796.1403)
  line L69 (204.2504, -796.1403) -> (204.2504, -789.7903)
  line L70 (204.2504, -789.7903) -> (178.8504, -789.7903)
  line L71 (178.8504, -789.7903) -> (178.8504, -796.1403)
  line L72 (204.2504, -796.1403) -> (229.6504, -796.1403)
  line L73 (229.6504, -796.1403) -> (229.6504, -802.4903)
  line L74 (229.6504, -802.4903) -> (204.2504, -802.4903)
  line L75 (204.2504, -802.4903) -> (204.2504, -796.1403)
  line L76 (229.6504, -796.1403) -> (255.0504, -796.1403)
  line L77 (255.0504, -796.1403) -> (255.0504, -802.4903)
  line L78 (255.0504, -802.4903) -> (229.6504, -802.4903)
  line L79 (229.6504, -802.4903) -> (229.6504, -796.1403)
  point P0 (0, 0)
  dimension "d113" = 12.7
  dimension "d114" = 12.7
  dimension "d115" = 25.4
  dimension "d116" = 6.35
  dimension "d117" = 25.4
  dimension "d118" = 25.4
  dimension "d119" = 25.4
  dimension "d120" = 25.4
  dimension "d121" = 25.4
  dimension "d122" = 25.4
  dimension "d123" = 25.4
  dimension "d124" = 25.4
  dimension "d125" = 25.4
  dimension "d126" = 25.4
  dimension "d127" = 25.4
  dimension "d128" = 25.4
  dimension "d129" = 25.4
  dimension "d130" = 25.4
  dimension "d131" = 25.4
  dimension "d132" = 25.4
  dimension "d133" = 25.4
  dimension "d134" = 25.4
extrude "Extrusion21" cut sketch "Sketch21" against normal blind 6.35 contours L71 L70 L69 L68 | L55 L54 L53 L52 | L39 L38 L37 L36 | L23 L22 L21 L20 | L7 L6 L5 L4 | L12 L13 L14 L9 | L30 L29 L28 L25 | L44 L45 L46 L41 | L60 L61 L62 L57 | L76 L77 L78 L73
sketch "Sketch22" plane through (0, 0, 0) normal (0, 0, -1) x (-1, 0, 0)
  line L0 (-240.2496, -764.3903) -> (-240.2496, -808.8403) projected
  line L1 (267.7504, -808.8403) -> (267.7504, -764.3903) projected
  line L2 (-227.5496, -789.7903) -> (-240.2496, -789.7903)
  line L3 (-240.2496, -789.7903) -> (-240.2496, -802.4903)
  line L4 (-240.2496, -802.4903) -> (-227.5496, -802.4903)
  line L5 (-227.5496, -802.4903) -> (-227.5496, -789.7903)
  line L6 (255.0504, -802.4903) -> (267.7504, -802.4903)
  line L7 (267.7504, -802.4903) -> (267.7504, -789.7903)
  line L8 (267.7504, -789.7903) -> (255.0504, -789.7903)
  line L9 (255.0504, -789.7903) -> (255.0504, -802.4903)
  point P0 (0, 0)
extrude "Extrusion22" cut sketch "Sketch22" against normal blind 6.35
sketch "Sketch23" plane through (0, 0, 0) normal (0, 0, -1) x (-1, 0, 0)
  circle A0 centre (-221.1996, -726.2903) radius 1.9812 projected
  circle A1 centre (248.7004, -728.2715) radius 1.9812 projected
  line L0 (255.0504, -789.7903) -> (267.7504, -789.7903) projected
  line L1 (267.7504, -789.7903) -> (267.7504, -764.3903) projected
  line L2 (267.7504, -764.3903) -> (261.4004, -764.3903) projected
  line L3 (261.4004, -764.3903) -> (261.4004, -738.9903) projected
  line L4 (261.4004, -738.9903) -> (267.7504, -738.9903) projected
  line L5 (267.7504, -738.9903) -> (267.7504, -713.5903) projected
  line L6 (267.7504, -713.5903) -> (229.6504, -713.5903) projected
  line L7 (229.6504, -713.5903) -> (229.6504, -764.3903) projected
  line L8 (229.6504, -764.3903) -> (-202.1496, -764.3903) projected
  line L9 (-202.1496, -764.3903) -> (-202.1496, -713.5903) projected
  line L10 (-202.1496, -713.5903) -> (-240.2496, -713.5903) projected
  line L11 (-240.2496, -713.5903) -> (-240.2496, -738.9903) projected
  line L12 (-240.2496, -738.9903) -> (-233.8996, -738.9903) projected
  line L13 (-233.8996, -738.9903) -> (-233.8996, -764.3903) projected
  line L14 (-233.8996, -764.3903) -> (-240.2496, -764.3903) projected
  line L15 (-240.2496, -764.3903) -> (-240.2496, -789.7903) projected
  line L16 (-240.2496, -789.7903) -> (-202.1496, -789.7903) projected
  line L17 (-75.1496, -796.1403) -> (-49.7496, -796.1403) projected
  line L18 (-202.1496, -789.7903) -> (255.0504, -789.7903)
  point P0 (0, 0)
extrude "Extrusion23" cut sketch "Sketch23" against normal blind 25.4
sketch "Sketch24" plane through (0, 0, 0) normal (0, 0, -1) x (-1, 0, 0)
  line L0 (-125.9496, -789.7903) -> (-202.1496, -789.7903) projected
  line L1 (-202.1496, -789.7903) -> (-202.1496, -796.1403) projected
  line L2 (-202.1496, -796.1403) -> (-227.5496, -796.1403) projected
  line L3 (-227.5496, -796.1403) -> (-227.5496, -802.4903) projected
  line L4 (-227.5496, -802.4903) -> (-240.2496, -802.4903) projected
  line L5 (-240.2496, -802.4903) -> (-240.2496, -808.8403) projected
  line L6 (-24.3496, -789.7903) -> (-100.5496, -789.7903) projected
  line L7 (-100.5496, -789.7903) -> (-100.5496, -796.1403) projected
  line L8 (-100.5496, -796.1403) -> (-125.9496, -796.1403) projected
  line L9 (-125.9496, -796.1403) -> (-125.9496, -789.7903) projected
  line L10 (51.8504, -802.4903) -> (26.4504, -802.4903) projected
  line L11 (26.4504, -802.4903) -> (26.4504, -796.1403) projected
  line L12 (26.4504, -796.1403) -> (51.8504, -796.1403) projected
  line L13 (51.8504, -796.1403) -> (51.8504, -802.4903) projected
  line L14 (153.4504, -802.4903) -> (128.0504, -802.4903) projected
  line L15 (128.0504, -802.4903) -> (128.0504, -796.1403) projected
  line L16 (128.0504, -796.1403) -> (153.4504, -796.1403) projected
  line L17 (153.4504, -796.1403) -> (153.4504, -802.4903) projected
  line L18 (-49.7496, -796.1403) -> (-49.7496, -802.4903) projected
  line L19 (-49.7496, -802.4903) -> (-75.1496, -802.4903) projected
  line L20 (-75.1496, -802.4903) -> (-75.1496, -796.1403) projected
  line L21 (-75.1496, -796.1403) -> (-49.7496, -796.1403) projected
  line L22 (-240.2496, -808.8403) -> (-77.6896, -808.8403)
  line L23 (-77.6896, -808.8403) -> (-77.6896, -789.7903)
  line L24 (-77.6896, -789.7903) -> (-240.2496, -789.7903)
  line L25 (-240.2496, -789.7903) -> (-240.2496, -808.8403)
  line L26 (-77.6896, -789.7903) -> (229.6504, -789.7903)
  line L27 (229.6504, -789.7903) -> (229.6504, -802.4903)
  line L28 (229.6504, -802.4903) -> (-77.6896, -802.4903)
  line L29 (-77.6896, -802.4903) -> (-77.6896, -789.7903)
  line L30 (105.1904, -808.8403) -> (267.7504, -808.8403)
  line L31 (267.7504, -808.8403) -> (267.7504, -789.7903)
  line L32 (267.7504, -789.7903) -> (105.1904, -789.7903)
  line L33 (105.1904, -789.7903) -> (105.1904, -808.8403)
  point P0 (0, 0)
extrude "Extrusion24" cut sketch "Sketch24" against normal blind 25.4 contours L9 L8 L7 L6 L23 L22 L5 L4 L3 L2 L1 L0 | L24 L7 L8 L9 | L1 L2 L3 L4 L25 L24 | L6 L26 L33 L28 L13 L12 L11 L18 L21 L20 L23 | L26 L27 L28 L17 L16 L15 L33 | L32 L31 L30 L33 L28 L14 L27 | L15 L16 L17 L14 | L10 L11 L12 L13
properties part number "back"
